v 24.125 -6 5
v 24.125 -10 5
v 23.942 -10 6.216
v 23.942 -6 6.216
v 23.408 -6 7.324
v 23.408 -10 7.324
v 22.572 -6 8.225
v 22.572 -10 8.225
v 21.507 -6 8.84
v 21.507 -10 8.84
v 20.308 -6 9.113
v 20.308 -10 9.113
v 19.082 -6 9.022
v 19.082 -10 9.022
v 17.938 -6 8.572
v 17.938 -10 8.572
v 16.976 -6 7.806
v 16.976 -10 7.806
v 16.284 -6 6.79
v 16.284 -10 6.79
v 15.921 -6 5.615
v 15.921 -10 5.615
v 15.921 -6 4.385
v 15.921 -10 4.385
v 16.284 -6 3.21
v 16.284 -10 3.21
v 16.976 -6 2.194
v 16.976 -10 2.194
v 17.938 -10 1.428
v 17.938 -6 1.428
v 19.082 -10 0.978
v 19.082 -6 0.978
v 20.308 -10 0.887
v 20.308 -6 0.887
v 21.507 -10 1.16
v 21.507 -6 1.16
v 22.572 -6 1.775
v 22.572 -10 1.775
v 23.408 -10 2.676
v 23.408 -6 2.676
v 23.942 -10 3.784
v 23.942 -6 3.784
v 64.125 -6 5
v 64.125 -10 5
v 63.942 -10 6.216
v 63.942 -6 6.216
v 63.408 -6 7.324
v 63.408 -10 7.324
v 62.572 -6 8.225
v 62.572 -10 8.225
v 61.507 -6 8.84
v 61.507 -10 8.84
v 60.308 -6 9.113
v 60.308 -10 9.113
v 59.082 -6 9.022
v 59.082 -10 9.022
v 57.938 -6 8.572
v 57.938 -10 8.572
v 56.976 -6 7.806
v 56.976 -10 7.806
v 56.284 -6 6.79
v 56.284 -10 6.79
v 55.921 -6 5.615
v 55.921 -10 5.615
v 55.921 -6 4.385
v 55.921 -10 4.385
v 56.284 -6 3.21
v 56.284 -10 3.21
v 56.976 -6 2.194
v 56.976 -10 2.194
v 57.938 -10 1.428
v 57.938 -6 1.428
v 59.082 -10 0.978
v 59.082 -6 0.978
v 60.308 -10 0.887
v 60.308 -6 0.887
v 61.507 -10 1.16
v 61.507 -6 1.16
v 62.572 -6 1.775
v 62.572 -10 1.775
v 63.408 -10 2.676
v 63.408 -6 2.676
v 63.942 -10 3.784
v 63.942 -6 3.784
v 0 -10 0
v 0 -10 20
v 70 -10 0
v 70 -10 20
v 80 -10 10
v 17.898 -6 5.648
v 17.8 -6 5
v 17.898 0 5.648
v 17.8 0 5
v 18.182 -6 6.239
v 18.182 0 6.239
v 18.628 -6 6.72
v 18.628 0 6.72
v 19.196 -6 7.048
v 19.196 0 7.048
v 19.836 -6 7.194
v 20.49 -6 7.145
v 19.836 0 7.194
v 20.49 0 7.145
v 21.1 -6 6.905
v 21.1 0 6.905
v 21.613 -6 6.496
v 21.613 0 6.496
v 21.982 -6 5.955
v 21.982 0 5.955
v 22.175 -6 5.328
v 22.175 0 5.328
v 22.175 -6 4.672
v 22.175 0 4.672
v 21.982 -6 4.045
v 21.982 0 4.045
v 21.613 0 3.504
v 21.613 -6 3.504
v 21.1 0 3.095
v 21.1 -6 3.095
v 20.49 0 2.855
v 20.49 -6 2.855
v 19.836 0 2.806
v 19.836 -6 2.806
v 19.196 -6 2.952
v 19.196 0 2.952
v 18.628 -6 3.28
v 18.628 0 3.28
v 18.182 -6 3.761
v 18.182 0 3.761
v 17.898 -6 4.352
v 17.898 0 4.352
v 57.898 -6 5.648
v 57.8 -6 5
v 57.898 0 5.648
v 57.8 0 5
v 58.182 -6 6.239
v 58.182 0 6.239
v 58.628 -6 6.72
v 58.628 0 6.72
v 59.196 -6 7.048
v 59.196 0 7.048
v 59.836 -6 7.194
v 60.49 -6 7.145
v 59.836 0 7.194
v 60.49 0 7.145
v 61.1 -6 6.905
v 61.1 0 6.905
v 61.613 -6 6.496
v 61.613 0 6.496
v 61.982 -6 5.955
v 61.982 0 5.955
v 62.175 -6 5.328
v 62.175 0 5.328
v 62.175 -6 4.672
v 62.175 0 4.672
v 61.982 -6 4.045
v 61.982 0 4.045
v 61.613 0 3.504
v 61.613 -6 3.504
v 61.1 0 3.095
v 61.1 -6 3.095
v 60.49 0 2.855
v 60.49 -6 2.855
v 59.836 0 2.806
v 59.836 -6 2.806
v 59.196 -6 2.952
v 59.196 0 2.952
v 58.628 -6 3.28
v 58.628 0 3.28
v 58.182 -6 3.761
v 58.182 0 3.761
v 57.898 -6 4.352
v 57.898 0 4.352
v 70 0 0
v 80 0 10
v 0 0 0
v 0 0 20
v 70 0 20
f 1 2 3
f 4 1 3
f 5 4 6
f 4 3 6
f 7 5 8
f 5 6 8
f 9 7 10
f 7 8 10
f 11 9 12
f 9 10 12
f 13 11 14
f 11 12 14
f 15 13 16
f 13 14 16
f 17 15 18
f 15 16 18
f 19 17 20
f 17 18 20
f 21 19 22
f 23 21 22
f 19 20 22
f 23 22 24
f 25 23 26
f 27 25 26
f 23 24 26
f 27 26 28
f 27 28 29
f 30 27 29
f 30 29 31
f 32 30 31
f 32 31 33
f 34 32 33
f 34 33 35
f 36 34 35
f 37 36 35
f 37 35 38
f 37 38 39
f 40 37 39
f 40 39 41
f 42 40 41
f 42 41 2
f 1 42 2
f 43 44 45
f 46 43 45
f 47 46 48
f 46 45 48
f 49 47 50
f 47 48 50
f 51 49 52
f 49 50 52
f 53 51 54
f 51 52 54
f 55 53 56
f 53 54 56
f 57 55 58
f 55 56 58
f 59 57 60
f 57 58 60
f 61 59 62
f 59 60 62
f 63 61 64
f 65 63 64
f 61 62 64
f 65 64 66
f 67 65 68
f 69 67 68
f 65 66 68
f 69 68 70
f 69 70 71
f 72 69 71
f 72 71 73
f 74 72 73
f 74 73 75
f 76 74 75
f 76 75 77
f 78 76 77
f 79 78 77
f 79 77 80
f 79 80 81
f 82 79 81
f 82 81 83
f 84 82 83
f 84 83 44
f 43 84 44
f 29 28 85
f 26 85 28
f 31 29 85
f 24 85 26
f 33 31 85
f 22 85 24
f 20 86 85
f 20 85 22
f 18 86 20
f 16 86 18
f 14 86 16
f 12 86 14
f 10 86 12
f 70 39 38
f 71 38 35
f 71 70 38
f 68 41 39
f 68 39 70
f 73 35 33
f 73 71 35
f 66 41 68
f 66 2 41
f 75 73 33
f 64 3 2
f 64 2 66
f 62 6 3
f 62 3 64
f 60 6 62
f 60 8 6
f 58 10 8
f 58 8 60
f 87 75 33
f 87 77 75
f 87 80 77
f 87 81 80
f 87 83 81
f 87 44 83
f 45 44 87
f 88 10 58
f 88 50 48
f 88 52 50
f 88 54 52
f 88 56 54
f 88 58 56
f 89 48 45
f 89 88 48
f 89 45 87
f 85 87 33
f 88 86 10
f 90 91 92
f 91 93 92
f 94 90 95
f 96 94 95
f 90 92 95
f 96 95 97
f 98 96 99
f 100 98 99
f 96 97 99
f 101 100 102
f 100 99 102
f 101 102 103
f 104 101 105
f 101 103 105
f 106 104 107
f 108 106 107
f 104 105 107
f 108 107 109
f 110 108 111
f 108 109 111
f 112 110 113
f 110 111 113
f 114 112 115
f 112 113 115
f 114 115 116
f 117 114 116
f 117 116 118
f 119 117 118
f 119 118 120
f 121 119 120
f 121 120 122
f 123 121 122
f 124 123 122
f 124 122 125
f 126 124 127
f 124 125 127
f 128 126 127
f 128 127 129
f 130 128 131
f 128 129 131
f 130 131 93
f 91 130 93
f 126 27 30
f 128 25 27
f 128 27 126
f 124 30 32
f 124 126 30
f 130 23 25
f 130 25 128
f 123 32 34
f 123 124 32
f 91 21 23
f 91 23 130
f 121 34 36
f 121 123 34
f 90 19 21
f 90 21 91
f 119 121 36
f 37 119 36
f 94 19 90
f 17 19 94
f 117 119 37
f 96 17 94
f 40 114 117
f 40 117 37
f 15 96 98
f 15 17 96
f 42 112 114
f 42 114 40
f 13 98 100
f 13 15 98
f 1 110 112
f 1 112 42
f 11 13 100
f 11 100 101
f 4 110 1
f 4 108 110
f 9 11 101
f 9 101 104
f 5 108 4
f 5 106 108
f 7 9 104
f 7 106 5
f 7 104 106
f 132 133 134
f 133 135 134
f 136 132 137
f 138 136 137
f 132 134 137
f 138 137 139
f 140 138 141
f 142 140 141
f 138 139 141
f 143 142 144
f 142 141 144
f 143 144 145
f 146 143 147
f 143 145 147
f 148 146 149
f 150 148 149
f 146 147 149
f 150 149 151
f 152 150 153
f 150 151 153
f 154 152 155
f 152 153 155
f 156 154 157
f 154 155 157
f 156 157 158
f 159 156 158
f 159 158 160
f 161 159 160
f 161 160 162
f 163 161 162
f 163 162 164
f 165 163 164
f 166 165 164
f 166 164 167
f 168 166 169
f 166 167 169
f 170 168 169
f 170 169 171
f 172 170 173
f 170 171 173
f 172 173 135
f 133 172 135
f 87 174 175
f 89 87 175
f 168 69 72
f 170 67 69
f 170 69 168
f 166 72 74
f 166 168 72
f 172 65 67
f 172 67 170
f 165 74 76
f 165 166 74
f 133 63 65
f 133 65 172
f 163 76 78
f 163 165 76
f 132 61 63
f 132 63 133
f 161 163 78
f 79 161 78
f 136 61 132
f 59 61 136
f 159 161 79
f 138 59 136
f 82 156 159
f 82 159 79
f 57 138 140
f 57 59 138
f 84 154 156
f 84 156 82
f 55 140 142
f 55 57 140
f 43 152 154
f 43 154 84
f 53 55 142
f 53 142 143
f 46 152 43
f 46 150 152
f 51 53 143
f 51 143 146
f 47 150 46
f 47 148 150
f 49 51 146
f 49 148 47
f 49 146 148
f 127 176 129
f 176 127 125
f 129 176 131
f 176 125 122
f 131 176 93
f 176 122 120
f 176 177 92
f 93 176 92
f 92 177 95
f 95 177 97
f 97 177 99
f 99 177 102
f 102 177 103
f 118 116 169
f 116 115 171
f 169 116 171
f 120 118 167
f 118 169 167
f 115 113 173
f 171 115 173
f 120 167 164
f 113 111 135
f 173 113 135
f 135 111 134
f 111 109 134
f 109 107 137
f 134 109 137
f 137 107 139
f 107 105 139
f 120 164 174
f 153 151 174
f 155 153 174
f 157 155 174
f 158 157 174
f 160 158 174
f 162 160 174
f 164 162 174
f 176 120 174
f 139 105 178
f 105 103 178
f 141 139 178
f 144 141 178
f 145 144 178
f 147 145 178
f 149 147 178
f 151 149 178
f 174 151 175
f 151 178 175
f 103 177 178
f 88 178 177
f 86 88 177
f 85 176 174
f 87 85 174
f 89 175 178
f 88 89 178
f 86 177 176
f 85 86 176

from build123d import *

# Parameters (mm, degrees)
F1_DEPTH       = 10
F3_D           = 4.4
F3_CBORE_D     = 8.25
F3_CBORE_DEPTH = 4


# Not quite as in the source:
# - a feature names something its author has since deleted; it is built from what else it names


with BuildPart() as f1:
    # F0 (on Front) → F1 (new body)
    with BuildSketch(Plane.XZ):
        Polygon((0, 10), (0, 0), (70, 0), (80, 10), align=None)
        Polygon((0, 20), (0, 10), (80, 10), (70, 20), align=None)
    extrude(amount=F1_DEPTH)

    # F3 (through all)
    with Locations(Plane.XZ.offset(10)):
        with Locations((20, 5), (60, 5)):
            CounterBoreHole(F3_D / 2, F3_CBORE_D / 2, F3_CBORE_DEPTH)


solid = f1.part
